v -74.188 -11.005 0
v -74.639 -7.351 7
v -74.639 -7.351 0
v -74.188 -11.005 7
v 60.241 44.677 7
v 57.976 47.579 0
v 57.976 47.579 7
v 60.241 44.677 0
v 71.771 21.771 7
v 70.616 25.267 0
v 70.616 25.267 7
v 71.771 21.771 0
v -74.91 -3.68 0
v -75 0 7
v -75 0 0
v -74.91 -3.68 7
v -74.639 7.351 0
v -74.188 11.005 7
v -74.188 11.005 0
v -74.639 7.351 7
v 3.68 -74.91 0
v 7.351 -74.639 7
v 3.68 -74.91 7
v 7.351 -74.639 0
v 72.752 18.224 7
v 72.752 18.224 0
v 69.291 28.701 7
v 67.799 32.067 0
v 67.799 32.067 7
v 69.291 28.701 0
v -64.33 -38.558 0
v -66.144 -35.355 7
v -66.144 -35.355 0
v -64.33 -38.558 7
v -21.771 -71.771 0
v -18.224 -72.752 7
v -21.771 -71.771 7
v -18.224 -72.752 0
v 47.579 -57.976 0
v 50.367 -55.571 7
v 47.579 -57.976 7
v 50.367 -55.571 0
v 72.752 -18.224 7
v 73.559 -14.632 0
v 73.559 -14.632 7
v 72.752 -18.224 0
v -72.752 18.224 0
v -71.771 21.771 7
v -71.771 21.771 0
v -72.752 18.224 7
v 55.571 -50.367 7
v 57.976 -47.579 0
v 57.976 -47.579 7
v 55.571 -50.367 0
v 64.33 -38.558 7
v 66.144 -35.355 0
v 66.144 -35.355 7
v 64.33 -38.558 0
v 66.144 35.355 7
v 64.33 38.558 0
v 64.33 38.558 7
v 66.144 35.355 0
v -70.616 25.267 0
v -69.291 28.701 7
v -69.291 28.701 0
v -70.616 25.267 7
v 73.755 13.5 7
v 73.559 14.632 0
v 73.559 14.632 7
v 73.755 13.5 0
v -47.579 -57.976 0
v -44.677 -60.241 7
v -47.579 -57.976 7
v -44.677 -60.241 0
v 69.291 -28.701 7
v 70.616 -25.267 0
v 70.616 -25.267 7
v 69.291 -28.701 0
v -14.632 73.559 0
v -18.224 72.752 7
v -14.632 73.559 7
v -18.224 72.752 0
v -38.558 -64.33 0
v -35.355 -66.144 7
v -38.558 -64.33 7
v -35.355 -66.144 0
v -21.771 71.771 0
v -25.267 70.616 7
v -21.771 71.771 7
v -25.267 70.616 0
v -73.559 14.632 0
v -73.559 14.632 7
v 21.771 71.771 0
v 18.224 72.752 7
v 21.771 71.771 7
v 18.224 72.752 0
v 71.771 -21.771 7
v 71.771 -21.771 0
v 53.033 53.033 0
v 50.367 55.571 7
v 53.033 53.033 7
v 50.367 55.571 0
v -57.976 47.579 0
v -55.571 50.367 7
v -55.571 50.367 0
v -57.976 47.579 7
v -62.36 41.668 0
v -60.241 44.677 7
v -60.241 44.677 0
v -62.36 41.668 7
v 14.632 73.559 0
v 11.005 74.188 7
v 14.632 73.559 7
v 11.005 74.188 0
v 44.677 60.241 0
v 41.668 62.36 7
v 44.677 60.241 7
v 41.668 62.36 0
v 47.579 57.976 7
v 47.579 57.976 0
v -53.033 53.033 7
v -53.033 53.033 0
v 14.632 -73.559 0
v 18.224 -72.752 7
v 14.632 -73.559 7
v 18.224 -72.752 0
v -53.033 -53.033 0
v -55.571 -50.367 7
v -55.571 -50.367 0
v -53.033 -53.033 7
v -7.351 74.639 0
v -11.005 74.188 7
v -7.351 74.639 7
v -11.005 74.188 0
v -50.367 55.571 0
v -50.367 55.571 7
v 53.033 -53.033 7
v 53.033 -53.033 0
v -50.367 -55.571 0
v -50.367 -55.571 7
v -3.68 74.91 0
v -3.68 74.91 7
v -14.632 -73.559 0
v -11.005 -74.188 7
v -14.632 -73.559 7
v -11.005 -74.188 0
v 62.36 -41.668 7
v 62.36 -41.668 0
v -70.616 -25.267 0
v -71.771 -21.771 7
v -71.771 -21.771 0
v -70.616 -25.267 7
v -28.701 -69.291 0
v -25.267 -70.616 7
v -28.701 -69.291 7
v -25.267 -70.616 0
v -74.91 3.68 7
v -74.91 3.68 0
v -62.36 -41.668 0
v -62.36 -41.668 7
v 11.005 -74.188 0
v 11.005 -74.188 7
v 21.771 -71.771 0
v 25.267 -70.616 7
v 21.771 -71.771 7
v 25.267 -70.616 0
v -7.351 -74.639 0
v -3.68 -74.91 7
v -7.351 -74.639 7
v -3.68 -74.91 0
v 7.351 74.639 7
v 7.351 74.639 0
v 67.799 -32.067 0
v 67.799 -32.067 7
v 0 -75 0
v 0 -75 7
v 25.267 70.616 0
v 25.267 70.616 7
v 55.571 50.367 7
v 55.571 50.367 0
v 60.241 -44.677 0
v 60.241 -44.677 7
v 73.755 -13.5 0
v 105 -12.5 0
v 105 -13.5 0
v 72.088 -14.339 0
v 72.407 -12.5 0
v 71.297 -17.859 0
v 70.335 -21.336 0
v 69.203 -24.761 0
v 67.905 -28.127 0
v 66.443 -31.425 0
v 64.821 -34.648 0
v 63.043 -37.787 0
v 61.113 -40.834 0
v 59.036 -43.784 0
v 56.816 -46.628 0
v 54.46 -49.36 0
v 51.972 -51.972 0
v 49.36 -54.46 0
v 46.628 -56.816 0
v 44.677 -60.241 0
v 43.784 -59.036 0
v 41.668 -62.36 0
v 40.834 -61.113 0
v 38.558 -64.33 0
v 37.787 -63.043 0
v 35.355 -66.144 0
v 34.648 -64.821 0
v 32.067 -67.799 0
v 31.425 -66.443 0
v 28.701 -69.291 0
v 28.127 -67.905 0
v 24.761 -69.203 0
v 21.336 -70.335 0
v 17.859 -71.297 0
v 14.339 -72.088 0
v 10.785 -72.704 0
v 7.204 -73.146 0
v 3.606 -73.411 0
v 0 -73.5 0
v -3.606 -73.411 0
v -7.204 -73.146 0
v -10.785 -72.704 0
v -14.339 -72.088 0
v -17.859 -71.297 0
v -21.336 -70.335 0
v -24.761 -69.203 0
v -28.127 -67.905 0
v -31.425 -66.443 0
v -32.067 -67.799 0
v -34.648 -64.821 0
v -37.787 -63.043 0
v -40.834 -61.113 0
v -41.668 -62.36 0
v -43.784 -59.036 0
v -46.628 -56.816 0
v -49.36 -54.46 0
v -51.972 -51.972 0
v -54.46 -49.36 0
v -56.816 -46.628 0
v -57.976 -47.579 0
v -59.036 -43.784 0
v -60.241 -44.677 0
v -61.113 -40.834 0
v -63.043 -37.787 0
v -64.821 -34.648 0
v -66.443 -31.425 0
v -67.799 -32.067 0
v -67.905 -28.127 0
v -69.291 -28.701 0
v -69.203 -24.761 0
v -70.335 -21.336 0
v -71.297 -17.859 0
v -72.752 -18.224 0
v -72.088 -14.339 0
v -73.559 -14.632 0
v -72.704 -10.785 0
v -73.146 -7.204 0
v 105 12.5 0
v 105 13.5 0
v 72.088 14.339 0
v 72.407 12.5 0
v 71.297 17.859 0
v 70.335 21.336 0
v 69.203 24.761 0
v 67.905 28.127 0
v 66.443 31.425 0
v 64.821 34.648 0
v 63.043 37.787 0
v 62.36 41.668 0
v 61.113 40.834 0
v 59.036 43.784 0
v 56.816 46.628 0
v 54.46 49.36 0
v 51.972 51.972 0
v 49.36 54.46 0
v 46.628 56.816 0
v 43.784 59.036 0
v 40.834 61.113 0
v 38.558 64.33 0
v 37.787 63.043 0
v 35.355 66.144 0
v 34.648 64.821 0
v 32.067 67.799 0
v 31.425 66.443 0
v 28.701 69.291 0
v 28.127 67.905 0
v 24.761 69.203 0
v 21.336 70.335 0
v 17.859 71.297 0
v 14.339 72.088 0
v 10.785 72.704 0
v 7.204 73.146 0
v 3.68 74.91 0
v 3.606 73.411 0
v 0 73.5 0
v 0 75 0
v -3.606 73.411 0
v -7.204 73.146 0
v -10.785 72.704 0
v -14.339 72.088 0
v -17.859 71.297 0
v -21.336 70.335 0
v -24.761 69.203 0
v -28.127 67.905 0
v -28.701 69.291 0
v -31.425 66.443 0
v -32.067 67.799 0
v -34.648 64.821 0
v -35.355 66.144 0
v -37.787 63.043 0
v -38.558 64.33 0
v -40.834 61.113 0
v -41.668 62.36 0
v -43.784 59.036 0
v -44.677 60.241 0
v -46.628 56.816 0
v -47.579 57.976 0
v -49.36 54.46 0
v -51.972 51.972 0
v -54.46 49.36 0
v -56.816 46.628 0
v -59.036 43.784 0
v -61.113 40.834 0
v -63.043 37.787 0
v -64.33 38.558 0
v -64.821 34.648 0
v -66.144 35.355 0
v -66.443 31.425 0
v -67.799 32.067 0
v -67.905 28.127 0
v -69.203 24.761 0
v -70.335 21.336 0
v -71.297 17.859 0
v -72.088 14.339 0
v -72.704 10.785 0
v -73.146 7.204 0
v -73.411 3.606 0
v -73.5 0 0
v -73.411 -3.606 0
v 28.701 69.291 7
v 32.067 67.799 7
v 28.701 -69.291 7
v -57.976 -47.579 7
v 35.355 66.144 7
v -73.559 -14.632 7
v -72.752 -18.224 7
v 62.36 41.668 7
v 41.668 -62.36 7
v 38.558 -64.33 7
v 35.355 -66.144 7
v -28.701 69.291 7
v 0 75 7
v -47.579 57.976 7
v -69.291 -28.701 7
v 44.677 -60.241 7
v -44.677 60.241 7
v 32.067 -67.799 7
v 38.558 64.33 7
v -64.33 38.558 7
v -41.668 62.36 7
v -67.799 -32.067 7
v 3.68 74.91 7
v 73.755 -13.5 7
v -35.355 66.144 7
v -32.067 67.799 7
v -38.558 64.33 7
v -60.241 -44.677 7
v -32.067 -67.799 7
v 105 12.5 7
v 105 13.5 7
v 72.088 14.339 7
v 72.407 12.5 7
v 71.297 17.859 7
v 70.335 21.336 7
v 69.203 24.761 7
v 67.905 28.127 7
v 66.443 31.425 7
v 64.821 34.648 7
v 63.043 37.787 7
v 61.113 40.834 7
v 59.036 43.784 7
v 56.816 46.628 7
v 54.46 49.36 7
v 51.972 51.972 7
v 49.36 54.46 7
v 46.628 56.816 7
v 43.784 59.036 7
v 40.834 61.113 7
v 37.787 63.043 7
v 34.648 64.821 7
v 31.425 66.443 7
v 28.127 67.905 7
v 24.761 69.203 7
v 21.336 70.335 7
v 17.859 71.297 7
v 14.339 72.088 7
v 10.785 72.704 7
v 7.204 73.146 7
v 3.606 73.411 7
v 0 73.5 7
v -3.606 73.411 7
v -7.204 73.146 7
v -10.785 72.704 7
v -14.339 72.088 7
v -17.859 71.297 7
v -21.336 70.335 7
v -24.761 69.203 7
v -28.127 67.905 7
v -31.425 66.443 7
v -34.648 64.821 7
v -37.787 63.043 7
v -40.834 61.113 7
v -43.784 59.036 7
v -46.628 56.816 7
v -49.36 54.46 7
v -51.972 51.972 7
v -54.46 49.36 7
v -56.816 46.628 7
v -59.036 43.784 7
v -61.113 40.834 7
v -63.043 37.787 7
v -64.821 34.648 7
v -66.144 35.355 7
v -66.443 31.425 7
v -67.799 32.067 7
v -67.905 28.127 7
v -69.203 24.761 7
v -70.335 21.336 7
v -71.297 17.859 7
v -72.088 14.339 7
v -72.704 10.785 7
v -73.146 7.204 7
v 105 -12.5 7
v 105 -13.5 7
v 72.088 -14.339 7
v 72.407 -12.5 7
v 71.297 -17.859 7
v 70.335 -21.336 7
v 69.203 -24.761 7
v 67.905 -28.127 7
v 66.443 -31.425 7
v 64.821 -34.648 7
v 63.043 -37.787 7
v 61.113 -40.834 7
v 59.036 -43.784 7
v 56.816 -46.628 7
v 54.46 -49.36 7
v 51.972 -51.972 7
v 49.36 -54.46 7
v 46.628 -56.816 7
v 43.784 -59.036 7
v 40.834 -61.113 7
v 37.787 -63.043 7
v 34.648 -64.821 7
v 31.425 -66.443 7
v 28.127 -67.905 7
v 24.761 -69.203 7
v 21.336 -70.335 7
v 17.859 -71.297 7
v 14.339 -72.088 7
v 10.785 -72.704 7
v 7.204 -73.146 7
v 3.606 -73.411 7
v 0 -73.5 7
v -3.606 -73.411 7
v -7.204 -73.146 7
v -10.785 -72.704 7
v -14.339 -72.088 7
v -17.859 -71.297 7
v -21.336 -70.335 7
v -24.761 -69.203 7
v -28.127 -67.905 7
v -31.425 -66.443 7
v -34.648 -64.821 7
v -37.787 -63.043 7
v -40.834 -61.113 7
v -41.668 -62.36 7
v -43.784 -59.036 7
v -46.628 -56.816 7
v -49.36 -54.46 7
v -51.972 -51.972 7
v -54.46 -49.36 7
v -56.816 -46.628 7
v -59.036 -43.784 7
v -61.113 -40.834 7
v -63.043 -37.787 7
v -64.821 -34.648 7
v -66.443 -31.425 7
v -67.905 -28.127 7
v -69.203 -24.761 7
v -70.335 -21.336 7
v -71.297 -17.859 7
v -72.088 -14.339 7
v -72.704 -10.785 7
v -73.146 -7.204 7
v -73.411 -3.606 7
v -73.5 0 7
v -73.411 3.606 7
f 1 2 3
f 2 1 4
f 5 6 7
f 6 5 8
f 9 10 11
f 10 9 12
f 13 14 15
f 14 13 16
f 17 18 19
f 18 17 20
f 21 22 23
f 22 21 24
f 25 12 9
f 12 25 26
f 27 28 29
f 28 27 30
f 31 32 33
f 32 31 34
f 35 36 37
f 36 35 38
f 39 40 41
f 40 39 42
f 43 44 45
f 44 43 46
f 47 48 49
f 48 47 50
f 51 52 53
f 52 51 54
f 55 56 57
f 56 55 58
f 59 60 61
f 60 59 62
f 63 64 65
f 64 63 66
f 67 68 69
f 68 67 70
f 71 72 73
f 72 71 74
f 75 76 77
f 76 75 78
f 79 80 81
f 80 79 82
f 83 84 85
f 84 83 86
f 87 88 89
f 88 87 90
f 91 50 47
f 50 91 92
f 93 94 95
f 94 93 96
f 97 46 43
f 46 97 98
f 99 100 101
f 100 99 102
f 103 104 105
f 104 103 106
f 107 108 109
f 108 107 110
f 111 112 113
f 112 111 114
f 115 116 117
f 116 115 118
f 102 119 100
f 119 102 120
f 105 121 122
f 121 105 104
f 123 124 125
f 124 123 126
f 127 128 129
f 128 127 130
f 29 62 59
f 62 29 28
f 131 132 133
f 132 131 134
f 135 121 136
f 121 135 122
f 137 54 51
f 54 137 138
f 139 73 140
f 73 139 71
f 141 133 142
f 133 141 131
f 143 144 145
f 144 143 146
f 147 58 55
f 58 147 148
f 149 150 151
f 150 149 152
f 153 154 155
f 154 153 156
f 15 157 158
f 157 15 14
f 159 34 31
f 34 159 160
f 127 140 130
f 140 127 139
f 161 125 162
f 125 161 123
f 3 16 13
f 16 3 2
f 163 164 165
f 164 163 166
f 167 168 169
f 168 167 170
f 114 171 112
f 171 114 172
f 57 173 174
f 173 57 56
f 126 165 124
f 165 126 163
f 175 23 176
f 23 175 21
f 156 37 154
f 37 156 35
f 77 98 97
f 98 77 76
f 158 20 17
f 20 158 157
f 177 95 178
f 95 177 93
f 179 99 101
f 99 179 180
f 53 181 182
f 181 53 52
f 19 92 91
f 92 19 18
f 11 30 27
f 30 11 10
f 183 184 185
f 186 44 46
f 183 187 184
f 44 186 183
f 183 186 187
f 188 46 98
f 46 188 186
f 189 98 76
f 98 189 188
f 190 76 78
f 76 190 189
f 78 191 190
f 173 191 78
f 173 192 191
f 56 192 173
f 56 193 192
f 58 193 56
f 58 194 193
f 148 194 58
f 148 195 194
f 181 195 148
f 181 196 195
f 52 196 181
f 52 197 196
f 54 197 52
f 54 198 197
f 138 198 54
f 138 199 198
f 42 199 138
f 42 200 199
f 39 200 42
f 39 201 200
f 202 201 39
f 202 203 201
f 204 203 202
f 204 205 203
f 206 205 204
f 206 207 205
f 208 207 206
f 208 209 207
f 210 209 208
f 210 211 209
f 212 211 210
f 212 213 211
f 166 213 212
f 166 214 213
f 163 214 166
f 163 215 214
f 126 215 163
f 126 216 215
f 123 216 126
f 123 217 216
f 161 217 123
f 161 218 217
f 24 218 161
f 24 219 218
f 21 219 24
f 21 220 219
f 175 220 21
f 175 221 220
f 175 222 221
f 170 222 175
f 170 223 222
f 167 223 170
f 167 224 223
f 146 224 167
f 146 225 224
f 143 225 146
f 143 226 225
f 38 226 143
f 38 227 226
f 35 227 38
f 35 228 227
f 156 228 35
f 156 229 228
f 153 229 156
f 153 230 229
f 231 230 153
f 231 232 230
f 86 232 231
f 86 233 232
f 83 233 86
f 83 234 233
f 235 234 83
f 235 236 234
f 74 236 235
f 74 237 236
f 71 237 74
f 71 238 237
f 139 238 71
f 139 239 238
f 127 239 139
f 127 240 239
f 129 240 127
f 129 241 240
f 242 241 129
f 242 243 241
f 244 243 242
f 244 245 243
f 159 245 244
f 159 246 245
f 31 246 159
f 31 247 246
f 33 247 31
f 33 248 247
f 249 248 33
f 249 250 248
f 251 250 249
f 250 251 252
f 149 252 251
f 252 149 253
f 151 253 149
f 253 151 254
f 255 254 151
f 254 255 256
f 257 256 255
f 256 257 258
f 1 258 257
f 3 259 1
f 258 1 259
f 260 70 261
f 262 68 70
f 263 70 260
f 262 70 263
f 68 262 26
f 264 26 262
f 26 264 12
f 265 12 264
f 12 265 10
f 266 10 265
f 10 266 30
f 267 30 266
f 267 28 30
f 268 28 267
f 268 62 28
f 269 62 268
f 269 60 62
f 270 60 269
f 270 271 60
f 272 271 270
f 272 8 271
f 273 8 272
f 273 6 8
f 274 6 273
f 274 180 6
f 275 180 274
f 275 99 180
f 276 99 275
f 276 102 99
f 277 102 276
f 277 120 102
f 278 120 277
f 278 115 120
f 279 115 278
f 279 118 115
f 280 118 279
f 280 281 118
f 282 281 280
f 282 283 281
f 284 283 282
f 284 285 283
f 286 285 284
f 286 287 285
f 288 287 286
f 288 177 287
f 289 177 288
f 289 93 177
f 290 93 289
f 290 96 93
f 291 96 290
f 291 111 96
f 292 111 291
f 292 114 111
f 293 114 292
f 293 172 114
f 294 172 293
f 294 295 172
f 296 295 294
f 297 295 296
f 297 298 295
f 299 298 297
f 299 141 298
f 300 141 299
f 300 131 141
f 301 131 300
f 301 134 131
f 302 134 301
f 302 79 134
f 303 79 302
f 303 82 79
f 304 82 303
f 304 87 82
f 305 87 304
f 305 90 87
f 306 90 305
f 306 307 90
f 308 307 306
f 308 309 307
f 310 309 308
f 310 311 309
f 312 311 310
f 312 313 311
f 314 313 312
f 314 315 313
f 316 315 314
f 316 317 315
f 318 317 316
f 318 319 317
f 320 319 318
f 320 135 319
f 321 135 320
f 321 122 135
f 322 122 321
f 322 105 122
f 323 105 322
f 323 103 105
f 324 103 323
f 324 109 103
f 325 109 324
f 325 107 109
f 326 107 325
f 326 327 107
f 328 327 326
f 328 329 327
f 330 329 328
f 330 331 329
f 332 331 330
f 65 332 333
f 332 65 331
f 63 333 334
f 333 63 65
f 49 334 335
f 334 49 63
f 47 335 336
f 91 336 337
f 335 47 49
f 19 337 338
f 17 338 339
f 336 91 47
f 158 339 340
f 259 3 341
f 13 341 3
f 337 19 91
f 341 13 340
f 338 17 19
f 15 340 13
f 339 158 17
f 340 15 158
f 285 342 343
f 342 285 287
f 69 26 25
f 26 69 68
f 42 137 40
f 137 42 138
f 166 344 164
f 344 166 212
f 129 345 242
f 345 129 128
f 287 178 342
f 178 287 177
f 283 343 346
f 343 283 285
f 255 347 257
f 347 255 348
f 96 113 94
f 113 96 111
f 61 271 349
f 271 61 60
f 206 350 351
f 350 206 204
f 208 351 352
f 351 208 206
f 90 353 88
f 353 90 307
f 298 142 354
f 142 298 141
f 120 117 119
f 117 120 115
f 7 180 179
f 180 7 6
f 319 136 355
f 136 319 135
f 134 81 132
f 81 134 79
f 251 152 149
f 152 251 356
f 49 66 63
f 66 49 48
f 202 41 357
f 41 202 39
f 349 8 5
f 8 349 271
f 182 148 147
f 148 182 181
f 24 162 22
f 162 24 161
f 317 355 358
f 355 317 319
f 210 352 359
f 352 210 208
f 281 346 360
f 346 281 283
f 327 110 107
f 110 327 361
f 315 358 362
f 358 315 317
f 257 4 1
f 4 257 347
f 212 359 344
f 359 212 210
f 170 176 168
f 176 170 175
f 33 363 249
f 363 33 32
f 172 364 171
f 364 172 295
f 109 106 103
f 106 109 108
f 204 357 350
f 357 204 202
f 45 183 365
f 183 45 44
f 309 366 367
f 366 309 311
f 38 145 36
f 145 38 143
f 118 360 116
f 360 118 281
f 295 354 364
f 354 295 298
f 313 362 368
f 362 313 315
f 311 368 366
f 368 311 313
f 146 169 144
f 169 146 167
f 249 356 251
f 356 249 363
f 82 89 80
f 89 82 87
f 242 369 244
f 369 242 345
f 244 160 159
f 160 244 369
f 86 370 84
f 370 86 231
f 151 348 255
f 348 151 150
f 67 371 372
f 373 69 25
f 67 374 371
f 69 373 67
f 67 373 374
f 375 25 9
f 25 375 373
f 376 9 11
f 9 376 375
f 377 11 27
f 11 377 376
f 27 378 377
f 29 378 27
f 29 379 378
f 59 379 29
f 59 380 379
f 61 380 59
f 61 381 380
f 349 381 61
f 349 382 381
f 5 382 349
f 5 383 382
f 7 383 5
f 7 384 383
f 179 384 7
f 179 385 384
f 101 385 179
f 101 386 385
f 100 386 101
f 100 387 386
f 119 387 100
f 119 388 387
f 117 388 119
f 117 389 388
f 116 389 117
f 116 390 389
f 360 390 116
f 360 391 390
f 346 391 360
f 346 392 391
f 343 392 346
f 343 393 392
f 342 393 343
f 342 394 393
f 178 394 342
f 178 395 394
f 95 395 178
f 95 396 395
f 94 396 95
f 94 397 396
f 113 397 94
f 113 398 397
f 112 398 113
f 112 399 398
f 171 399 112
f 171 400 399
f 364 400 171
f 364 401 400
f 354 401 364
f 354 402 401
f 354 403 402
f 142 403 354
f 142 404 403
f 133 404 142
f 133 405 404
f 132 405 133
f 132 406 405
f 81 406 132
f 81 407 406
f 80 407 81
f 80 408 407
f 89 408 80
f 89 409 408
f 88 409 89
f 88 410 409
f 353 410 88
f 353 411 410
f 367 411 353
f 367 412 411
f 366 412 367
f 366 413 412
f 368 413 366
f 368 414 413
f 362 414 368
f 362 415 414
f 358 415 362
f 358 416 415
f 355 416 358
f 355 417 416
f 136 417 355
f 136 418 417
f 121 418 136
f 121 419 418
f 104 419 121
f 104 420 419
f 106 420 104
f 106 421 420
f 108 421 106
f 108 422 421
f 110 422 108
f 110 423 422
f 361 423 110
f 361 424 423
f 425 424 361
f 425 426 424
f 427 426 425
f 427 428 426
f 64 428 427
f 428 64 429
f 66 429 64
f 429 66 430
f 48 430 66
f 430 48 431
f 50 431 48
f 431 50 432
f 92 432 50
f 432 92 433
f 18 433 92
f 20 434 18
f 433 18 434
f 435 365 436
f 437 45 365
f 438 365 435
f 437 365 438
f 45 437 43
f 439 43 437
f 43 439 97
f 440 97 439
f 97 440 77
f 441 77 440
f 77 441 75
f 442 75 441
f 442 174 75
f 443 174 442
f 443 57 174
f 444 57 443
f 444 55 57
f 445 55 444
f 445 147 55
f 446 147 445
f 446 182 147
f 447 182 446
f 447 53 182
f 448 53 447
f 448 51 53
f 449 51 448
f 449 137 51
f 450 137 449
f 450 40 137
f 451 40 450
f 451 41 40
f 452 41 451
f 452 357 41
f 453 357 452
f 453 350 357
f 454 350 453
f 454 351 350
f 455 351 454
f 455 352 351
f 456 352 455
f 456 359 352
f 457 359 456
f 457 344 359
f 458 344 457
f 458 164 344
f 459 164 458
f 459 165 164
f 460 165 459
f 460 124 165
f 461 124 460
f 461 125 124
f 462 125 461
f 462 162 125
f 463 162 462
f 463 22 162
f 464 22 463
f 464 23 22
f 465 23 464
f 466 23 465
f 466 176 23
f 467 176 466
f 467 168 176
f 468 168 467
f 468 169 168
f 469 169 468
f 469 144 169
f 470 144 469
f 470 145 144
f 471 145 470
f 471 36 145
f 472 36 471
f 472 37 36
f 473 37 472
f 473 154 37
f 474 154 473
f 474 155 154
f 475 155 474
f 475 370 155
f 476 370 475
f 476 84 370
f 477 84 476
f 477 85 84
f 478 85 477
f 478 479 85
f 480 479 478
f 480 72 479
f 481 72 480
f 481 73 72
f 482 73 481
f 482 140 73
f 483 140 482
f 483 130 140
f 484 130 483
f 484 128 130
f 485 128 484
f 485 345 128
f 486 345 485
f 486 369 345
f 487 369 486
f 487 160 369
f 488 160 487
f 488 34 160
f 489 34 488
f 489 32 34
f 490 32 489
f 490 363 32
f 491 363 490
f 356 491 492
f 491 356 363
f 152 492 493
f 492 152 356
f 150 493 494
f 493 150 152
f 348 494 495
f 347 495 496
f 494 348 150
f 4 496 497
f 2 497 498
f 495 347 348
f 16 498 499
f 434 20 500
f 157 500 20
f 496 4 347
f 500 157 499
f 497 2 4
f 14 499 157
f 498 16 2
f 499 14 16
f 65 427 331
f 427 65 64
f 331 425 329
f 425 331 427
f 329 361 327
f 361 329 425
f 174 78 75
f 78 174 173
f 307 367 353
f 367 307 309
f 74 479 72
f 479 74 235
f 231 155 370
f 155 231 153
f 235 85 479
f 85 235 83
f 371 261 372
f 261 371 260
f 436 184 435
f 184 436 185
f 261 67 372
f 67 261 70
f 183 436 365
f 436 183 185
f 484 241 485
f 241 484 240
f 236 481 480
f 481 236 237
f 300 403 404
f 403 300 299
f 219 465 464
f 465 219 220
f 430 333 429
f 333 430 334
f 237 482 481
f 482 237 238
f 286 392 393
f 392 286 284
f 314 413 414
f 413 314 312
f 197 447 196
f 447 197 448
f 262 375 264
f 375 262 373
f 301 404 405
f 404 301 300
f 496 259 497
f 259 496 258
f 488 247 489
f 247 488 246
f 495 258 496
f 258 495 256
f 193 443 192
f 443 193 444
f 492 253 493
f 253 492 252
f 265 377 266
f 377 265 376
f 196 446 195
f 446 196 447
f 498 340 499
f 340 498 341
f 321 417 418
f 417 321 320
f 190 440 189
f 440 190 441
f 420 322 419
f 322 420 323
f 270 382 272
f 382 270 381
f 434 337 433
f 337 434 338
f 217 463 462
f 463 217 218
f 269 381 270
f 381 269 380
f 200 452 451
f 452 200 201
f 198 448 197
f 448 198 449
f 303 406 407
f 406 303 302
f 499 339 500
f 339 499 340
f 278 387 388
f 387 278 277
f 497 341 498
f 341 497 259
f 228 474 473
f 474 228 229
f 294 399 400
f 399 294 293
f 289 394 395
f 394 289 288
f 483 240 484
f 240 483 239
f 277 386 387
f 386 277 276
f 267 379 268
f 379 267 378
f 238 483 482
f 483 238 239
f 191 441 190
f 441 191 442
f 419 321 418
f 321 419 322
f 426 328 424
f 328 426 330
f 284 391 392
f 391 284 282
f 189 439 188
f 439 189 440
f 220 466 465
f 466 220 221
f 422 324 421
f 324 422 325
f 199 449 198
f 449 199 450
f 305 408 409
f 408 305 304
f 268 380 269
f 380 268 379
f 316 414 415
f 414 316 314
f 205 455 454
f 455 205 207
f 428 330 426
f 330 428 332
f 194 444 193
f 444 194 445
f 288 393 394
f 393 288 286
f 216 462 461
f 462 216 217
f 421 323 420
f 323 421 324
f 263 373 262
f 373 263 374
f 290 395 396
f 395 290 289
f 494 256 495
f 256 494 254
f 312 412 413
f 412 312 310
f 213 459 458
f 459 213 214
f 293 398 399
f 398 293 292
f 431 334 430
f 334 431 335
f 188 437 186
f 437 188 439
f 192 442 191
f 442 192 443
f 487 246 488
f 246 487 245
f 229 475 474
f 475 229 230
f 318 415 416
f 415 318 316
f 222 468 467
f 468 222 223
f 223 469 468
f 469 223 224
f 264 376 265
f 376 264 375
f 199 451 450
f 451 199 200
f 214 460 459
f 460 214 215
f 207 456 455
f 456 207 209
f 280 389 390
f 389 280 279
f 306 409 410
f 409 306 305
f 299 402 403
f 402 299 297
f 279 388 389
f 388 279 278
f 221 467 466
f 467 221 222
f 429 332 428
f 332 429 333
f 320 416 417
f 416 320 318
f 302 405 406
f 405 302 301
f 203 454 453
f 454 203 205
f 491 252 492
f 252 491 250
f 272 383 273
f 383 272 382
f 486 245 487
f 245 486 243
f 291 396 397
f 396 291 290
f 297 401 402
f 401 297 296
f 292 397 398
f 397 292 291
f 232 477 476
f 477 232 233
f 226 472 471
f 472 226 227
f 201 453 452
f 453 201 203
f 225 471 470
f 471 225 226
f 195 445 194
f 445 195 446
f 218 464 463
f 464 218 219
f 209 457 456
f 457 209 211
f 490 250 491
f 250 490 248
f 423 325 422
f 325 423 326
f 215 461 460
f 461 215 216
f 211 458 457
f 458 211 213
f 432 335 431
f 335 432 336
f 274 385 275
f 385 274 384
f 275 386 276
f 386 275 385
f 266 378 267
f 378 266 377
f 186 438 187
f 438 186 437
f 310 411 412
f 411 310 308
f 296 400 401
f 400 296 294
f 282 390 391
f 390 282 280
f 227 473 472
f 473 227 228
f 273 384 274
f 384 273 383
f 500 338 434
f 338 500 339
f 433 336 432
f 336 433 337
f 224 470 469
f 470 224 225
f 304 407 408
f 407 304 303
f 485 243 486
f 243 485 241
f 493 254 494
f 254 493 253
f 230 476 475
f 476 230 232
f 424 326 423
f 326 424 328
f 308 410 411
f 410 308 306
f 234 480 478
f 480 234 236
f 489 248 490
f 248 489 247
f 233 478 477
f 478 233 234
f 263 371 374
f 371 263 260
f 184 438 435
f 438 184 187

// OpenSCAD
standThickness = 5;
standDiameter = 120;
standHeight = 30;
rodDiameter = 6;
tolerance = 0.5;
rodHolderOuterDiameter = 20;
rodHolderInnerDiameter = 10;

$fn = $preview ? 16 : 128;

module lamp_stand(args) {
  
  
  cylinder(r=standDiameter/2, h=standThickness, center=false);
  difference() {
    cylinder(d1=rodHolderOuterDiameter, d2=rodHolderInnerDiameter, h=standHeight, center=false);
  
    translate([0, 0, 5]) {
      cylinder(d=rodDiameter + tolerance, h=standHeight + 2, center=false);
    }
  }
}


module lamp_holder(args) {
  holderWidth = 36;
  lampDiameter = 27 + tolerance;
  lampHeight = 46;
  lampCordSpaceHeight = 15;
  thickness = 4;
  
  difference() {
    union() {
      cylinder(d=lampDiameter + thickness, h=lampHeight + lampCordSpaceHeight, center=false);
      translate([0, 0, lampHeight + lampCordSpaceHeight]) {
        sphere(d=lampDiameter + thickness);
      }
    }

    union() {
      translate([0, 0, -1]) {
        cylinder(d=lampDiameter, h=lampHeight + 1, center=false);
      }
  
      translate([0, 0, lampHeight]) {
        cylinder(d1=lampDiameter, d2=rodHolderInnerDiameter, h=lampCordSpaceHeight, center=false);
      }

      translate([-7/2, 0, -1]) {
        cube(size=[7, lampDiameter, lampHeight + lampCordSpaceHeight + 1], center=false);
      }

      translate([0, 0, lampHeight + lampCordSpaceHeight + 2]) {
        cylinder(d=rodDiameter + tolerance, h=100, center=false);
      }
    }
  }
}

module lamp_ring(args) {
  lampDiameter = 150;
  lampHeight = 7;
  ringThickness = 3;
  thickness = 1;
  
  difference() {
    union() {
      cylinder(d=lampDiameter, h=lampHeight, center=false);
      translate([lampDiameter / 2, 0, lampHeight / 2]) {
        cube(size=[60, 27, lampHeight], center=true);
      }
    }

    union() {
      translate([0, 0, -1]) {
        cylinder(d=lampDiameter - ringThickness, h=lampHeight + 2, center=false);

        translate([lampDiameter / 2 - 1, 0, lampHeight / 2 + 1]) {
          cube(size=[60 + 3, 27 - thickness * 2, lampHeight + 2], center=true);
        }
      }
  
      
    }
  }
}

//lamp_holder();
//lamp_stand();
lamp_ring();
